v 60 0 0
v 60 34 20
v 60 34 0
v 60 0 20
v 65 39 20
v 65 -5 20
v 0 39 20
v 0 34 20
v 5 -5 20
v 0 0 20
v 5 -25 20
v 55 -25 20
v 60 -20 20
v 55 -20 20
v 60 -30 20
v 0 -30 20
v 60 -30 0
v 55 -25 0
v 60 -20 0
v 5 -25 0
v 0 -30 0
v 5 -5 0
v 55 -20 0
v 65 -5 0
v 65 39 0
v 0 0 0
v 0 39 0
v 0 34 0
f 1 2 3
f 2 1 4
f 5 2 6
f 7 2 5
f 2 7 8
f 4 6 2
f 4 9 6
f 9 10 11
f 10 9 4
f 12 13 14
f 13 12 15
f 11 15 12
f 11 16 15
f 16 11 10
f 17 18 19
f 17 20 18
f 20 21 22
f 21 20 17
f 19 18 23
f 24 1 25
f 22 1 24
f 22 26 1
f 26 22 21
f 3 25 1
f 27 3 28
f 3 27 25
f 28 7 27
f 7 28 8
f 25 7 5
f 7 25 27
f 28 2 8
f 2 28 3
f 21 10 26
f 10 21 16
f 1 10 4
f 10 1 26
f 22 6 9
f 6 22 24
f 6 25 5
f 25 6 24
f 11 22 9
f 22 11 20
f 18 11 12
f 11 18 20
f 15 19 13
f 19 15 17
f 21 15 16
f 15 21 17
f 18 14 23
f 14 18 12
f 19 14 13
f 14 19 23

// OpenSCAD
tableHeight = 34;
tableRadius = 20.95;
hookHeight = 20;
hookWidth = 50;
baseWidth = 60;
thickness = 5;
width = 20;

// % translate([0, 0, -width / 2]) cube([baseWidth, tableHeight, width]);

scale([1, 1, 1])
union() {

	translate([0, tableHeight, 0])
	cube([baseWidth, thickness, width]);

	translate([0, -thickness, 0])
	cube([baseWidth, thickness, width]);

	translate([baseWidth, -thickness, 0])
	cube([thickness, tableHeight + thickness * 2, width]);

	translate([0, -hookHeight - thickness, 0])
	cube([thickness, hookHeight, width]);

	translate([0, -hookHeight - thickness * 2, 0])
	cube([baseWidth, thickness, width]);

	translate([baseWidth - thickness, -hookHeight - thickness, 0])
	cube([thickness, thickness, width]);
}
